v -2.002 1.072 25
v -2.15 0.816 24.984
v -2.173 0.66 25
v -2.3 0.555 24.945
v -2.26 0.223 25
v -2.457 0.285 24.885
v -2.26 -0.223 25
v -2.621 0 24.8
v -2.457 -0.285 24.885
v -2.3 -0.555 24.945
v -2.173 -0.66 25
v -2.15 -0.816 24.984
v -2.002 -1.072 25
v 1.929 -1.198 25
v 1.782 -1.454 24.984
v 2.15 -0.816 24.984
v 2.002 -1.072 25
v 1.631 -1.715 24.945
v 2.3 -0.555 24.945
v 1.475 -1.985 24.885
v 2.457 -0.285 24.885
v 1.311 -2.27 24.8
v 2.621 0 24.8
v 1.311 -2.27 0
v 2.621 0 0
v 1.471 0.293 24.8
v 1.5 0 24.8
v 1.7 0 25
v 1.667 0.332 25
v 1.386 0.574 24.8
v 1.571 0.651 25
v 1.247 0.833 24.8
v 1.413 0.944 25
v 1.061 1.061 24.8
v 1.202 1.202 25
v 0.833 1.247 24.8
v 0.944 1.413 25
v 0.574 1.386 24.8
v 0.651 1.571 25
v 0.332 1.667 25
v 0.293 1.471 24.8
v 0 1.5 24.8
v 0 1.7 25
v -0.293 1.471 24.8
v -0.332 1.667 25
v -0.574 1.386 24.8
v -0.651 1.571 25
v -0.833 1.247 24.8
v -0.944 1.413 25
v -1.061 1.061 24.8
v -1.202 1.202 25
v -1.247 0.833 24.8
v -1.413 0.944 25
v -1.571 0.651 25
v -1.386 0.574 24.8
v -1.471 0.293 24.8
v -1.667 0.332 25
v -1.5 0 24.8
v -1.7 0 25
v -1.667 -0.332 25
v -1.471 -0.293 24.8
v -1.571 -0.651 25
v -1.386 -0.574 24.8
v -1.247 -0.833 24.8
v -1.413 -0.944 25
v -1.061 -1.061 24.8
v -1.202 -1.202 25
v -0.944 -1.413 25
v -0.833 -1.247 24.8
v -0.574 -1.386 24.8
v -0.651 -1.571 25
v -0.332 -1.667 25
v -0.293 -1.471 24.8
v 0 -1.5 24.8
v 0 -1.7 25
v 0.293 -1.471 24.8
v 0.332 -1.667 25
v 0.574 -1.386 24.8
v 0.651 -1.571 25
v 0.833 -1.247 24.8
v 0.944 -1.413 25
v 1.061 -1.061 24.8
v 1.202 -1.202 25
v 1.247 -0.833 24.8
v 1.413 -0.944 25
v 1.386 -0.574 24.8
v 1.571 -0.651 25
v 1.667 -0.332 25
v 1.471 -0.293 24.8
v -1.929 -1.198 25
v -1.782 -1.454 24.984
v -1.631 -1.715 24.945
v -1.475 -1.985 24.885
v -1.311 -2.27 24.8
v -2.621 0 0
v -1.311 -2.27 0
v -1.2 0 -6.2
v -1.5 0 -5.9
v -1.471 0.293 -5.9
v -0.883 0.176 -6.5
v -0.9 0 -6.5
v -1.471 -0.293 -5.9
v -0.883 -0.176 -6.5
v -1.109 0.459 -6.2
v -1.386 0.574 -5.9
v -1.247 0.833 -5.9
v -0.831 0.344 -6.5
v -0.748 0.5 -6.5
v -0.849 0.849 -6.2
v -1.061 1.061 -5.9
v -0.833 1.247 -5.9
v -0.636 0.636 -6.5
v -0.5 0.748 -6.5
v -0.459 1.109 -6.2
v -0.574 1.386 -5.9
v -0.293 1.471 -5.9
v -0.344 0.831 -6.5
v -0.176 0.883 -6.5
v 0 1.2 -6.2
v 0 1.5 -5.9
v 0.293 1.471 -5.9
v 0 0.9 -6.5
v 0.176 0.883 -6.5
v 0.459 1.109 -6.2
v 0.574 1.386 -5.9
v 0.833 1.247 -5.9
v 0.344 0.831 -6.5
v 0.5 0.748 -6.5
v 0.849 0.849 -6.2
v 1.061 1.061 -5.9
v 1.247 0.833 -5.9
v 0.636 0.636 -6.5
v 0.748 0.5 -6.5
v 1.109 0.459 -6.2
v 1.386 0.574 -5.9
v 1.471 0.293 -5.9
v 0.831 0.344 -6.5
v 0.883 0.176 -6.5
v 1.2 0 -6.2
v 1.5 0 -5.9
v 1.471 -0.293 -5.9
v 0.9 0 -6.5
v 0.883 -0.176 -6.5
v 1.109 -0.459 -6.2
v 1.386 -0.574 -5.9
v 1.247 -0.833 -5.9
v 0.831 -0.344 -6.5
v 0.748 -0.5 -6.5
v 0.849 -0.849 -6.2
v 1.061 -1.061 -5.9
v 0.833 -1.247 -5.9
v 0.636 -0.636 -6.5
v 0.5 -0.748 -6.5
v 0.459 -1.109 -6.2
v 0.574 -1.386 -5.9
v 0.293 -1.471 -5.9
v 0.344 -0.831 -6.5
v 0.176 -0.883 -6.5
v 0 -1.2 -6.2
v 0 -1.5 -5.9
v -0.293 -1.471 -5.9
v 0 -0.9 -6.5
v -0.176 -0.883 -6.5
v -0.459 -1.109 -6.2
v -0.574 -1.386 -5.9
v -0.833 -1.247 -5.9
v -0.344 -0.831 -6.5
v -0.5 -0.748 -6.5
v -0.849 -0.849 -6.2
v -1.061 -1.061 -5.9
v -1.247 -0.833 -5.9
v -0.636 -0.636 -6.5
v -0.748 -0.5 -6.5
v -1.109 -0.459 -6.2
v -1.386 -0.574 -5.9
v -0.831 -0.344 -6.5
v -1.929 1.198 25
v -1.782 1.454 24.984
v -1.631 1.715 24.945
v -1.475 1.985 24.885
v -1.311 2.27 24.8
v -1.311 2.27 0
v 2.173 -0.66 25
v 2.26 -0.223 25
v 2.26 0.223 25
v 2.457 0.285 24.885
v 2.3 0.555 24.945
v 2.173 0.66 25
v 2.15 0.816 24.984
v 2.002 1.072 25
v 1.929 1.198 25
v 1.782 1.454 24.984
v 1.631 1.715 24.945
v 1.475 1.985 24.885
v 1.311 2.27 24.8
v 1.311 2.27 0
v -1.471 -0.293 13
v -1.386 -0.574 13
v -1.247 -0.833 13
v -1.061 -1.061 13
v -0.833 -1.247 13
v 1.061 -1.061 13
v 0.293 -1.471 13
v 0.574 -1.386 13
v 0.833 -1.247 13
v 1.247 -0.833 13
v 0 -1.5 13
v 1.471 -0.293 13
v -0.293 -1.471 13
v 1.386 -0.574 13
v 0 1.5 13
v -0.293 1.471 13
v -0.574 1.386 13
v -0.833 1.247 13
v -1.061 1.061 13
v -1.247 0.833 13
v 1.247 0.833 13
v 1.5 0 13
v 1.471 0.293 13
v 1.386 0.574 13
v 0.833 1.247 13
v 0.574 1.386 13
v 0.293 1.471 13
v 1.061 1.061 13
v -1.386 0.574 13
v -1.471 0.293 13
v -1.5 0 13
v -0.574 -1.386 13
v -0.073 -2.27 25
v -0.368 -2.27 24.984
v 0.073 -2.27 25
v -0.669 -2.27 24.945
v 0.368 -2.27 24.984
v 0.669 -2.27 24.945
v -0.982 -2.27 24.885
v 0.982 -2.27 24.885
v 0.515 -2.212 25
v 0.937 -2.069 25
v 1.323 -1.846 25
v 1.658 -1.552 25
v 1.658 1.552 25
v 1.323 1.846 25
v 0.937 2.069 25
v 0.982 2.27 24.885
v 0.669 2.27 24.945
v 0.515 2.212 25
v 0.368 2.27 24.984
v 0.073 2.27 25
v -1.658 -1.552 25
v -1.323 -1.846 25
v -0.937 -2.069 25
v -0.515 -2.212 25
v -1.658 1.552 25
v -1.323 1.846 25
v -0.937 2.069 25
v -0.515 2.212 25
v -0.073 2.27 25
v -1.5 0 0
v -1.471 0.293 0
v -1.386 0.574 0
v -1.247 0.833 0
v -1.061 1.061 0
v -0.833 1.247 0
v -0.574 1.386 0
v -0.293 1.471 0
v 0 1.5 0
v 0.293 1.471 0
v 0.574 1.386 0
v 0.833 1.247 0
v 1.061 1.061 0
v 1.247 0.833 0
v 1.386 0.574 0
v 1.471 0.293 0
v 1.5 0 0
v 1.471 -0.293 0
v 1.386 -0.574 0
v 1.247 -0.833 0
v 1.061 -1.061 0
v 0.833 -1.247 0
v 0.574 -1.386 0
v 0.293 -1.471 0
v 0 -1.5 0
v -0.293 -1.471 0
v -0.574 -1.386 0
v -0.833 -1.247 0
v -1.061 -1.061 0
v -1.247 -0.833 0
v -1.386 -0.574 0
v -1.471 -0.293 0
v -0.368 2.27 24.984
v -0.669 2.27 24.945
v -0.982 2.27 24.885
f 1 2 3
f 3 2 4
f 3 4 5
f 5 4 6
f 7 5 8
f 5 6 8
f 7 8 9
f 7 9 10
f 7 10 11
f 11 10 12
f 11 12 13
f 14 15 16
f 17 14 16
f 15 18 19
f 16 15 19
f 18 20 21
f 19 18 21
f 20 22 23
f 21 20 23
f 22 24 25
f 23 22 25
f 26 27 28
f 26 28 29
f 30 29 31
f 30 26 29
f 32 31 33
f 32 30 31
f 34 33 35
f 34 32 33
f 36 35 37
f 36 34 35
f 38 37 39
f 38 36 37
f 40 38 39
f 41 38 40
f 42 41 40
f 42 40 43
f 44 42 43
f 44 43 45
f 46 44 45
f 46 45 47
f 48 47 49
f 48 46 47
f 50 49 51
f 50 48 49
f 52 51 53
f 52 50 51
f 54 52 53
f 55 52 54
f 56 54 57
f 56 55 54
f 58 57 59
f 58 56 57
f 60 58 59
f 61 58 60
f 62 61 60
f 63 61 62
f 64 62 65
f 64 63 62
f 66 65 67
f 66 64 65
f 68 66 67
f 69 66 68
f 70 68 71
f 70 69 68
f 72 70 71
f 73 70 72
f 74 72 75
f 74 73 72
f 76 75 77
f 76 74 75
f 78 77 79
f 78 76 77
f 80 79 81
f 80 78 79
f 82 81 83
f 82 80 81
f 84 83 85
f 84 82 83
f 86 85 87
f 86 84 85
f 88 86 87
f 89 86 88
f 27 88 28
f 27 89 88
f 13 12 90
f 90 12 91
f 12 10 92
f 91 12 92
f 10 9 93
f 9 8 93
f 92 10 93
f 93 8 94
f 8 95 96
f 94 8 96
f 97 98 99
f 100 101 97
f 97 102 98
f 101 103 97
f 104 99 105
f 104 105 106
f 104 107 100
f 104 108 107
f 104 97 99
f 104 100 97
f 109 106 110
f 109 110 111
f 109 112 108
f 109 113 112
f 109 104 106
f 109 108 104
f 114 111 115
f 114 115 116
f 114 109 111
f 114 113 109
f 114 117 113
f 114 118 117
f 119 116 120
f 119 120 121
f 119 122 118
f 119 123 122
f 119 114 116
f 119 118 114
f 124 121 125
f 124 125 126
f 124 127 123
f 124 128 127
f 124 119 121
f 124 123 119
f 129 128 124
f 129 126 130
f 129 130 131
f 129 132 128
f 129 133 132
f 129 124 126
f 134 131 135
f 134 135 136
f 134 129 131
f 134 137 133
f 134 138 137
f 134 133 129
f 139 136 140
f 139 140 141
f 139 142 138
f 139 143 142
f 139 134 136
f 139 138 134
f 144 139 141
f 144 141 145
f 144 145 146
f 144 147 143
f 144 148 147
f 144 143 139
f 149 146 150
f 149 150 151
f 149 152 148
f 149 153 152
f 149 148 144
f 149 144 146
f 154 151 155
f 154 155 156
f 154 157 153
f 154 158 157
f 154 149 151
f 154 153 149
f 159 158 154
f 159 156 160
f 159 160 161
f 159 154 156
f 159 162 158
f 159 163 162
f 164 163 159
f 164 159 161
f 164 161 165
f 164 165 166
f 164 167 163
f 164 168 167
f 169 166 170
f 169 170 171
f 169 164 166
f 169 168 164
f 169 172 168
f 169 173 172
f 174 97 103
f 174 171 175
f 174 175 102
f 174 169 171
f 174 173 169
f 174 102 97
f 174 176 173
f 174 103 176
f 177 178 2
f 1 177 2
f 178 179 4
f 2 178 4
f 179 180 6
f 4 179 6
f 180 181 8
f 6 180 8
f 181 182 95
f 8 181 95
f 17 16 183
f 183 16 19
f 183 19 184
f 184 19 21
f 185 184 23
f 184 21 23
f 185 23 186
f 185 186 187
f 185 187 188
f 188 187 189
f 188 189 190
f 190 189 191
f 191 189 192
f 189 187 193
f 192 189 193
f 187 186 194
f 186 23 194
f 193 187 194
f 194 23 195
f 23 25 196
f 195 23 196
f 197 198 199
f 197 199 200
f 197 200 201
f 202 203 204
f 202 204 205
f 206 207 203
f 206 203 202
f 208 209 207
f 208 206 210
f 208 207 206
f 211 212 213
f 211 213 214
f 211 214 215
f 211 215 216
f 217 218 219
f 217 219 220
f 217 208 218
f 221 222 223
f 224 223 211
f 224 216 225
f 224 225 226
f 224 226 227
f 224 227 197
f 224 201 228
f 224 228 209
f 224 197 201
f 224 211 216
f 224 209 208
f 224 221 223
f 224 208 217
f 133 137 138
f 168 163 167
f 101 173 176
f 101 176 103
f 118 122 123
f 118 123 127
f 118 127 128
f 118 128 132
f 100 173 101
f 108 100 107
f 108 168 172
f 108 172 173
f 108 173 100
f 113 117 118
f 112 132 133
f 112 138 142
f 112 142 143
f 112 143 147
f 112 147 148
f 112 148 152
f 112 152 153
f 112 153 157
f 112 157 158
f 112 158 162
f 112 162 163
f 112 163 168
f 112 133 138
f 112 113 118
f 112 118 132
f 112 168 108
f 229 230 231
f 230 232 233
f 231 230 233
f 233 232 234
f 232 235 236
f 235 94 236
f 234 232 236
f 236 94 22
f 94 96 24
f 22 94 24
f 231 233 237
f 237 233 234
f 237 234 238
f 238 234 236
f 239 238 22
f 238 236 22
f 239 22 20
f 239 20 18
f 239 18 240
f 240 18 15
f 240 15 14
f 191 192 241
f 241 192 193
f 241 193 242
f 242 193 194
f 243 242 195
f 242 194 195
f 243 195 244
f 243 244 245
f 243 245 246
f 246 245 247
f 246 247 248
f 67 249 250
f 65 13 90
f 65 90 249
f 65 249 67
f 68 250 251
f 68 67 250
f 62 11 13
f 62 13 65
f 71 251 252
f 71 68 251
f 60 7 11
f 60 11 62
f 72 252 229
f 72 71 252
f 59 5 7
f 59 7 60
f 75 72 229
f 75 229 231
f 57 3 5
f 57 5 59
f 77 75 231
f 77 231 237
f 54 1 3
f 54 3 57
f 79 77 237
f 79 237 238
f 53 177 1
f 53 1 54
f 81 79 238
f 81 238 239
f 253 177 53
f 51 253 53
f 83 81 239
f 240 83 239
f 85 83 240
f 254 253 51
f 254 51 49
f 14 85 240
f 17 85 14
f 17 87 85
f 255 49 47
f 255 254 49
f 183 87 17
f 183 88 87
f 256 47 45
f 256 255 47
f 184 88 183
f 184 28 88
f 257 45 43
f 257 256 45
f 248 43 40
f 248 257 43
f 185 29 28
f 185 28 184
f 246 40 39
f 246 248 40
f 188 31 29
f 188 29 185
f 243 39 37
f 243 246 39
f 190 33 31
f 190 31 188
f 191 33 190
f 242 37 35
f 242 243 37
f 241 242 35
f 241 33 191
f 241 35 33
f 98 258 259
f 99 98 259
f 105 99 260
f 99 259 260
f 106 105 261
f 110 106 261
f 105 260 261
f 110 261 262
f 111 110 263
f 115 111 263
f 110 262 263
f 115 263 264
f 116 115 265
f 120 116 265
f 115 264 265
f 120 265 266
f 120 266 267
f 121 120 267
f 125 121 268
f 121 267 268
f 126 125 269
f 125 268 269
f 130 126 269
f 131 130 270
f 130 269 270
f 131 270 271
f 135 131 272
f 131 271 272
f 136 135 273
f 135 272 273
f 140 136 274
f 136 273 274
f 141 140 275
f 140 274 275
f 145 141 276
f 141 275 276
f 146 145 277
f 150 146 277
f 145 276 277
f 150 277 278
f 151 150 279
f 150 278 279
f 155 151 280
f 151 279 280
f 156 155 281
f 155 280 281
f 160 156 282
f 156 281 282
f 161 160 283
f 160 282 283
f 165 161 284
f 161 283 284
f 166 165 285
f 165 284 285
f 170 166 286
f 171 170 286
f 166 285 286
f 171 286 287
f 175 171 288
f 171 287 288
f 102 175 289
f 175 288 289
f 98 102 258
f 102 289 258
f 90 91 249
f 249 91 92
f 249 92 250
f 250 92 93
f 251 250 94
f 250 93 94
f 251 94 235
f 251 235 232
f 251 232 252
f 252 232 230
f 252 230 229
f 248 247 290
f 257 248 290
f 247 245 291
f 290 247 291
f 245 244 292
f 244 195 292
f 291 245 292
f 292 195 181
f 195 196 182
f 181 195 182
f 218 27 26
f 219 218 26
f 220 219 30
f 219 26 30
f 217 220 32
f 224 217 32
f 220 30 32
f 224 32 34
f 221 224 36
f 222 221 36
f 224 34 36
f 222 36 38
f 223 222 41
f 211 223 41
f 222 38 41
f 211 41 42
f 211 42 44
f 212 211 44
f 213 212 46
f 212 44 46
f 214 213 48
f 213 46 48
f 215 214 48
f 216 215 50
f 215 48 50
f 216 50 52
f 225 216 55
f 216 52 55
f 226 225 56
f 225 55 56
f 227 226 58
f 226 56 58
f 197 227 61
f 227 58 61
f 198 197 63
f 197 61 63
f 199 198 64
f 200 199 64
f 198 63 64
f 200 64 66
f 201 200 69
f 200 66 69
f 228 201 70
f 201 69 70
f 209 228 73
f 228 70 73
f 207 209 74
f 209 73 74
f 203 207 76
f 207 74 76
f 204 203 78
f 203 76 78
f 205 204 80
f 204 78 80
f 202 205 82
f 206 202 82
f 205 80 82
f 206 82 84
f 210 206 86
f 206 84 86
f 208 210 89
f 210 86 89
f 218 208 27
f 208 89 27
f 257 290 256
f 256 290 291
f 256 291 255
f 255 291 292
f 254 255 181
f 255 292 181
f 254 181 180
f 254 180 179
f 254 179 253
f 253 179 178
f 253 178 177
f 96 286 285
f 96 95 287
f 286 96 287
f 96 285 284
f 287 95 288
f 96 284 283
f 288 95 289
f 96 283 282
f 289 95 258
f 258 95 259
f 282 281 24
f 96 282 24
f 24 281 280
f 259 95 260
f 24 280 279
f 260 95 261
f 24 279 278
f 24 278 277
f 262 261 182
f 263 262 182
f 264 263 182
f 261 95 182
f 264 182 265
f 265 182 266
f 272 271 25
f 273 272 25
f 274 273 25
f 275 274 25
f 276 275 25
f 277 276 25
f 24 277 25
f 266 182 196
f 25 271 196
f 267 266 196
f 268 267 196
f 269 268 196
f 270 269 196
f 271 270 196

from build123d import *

# Parameters (mm, degrees)
BOSS_EXTRUDE1_DEPTH     = 25
SKETCH2_R               = 1.5
CUT_EXTRUDE1_DEPTH      = 1
CUT_EXTRUDE1_DEPTH_BACK = 12
CHAMFER1_SIZE           = 0.2
SKETCH4_R               = 1.5
BOSS_EXTRUDE2_DEPTH     = 6.5
CHAMFER2_SIZE           = 0.6


with BuildPart() as part:
    # Sketch1 → Boss-Extrude1 (new body)
    with BuildSketch(Plane.XY):
        Polygon((2.621170222, 0), (1.310585111, 2.27), (-1.310585111, 2.27), (-2.621170222, 0), (-1.310585111, -2.27), (1.310585111, -2.27), align=None)
    extrude(amount=BOSS_EXTRUDE1_DEPTH)

    # Sketch2 → Cut-Extrude1 (cut, two sides)
    with BuildSketch(Plane.XY.offset(25)) as cut_extrude1_sk:
        Circle(SKETCH2_R)
    extrude(amount=CUT_EXTRUDE1_DEPTH, mode=Mode.SUBTRACT)
    extrude(cut_extrude1_sk.sketch, amount=-CUT_EXTRUDE1_DEPTH_BACK, mode=Mode.SUBTRACT)

    # Sketch3 → Cut-Revolve1 (revolve, cut)
    with BuildSketch(Plane(origin=(0, 0, 0), x_dir=(1, 0, 0), z_dir=(0, 1, 0))):
        Polygon((-2.621170222, -25), (-2.271170222, -25), (-2.621170222, -24.8), align=None)
    revolve(axis=Axis((0, 0, 13), (0, 0, 1)), mode=Mode.SUBTRACT)

    # Chamfer1
    chamfer1_edges = [part.edges().sort_by_distance(p)[0] for p in [
        (-1.5, 0, 25),
    ]]
    chamfer(chamfer1_edges, length=CHAMFER1_SIZE)

    # Sketch4 → Boss-Extrude2 (add)
    with BuildSketch(Plane(origin=(0, 0, 0), x_dir=(-1, 0, 0), z_dir=(0, 0, -1))):
        Circle(SKETCH4_R)
    extrude(amount=BOSS_EXTRUDE2_DEPTH)

    # Chamfer2
    chamfer2_edges = [part.edges().sort_by_distance(p)[0] for p in [
        (1.5, 0, -6.5),
    ]]
    chamfer(chamfer2_edges, length=CHAMFER2_SIZE)


solid = part.part
